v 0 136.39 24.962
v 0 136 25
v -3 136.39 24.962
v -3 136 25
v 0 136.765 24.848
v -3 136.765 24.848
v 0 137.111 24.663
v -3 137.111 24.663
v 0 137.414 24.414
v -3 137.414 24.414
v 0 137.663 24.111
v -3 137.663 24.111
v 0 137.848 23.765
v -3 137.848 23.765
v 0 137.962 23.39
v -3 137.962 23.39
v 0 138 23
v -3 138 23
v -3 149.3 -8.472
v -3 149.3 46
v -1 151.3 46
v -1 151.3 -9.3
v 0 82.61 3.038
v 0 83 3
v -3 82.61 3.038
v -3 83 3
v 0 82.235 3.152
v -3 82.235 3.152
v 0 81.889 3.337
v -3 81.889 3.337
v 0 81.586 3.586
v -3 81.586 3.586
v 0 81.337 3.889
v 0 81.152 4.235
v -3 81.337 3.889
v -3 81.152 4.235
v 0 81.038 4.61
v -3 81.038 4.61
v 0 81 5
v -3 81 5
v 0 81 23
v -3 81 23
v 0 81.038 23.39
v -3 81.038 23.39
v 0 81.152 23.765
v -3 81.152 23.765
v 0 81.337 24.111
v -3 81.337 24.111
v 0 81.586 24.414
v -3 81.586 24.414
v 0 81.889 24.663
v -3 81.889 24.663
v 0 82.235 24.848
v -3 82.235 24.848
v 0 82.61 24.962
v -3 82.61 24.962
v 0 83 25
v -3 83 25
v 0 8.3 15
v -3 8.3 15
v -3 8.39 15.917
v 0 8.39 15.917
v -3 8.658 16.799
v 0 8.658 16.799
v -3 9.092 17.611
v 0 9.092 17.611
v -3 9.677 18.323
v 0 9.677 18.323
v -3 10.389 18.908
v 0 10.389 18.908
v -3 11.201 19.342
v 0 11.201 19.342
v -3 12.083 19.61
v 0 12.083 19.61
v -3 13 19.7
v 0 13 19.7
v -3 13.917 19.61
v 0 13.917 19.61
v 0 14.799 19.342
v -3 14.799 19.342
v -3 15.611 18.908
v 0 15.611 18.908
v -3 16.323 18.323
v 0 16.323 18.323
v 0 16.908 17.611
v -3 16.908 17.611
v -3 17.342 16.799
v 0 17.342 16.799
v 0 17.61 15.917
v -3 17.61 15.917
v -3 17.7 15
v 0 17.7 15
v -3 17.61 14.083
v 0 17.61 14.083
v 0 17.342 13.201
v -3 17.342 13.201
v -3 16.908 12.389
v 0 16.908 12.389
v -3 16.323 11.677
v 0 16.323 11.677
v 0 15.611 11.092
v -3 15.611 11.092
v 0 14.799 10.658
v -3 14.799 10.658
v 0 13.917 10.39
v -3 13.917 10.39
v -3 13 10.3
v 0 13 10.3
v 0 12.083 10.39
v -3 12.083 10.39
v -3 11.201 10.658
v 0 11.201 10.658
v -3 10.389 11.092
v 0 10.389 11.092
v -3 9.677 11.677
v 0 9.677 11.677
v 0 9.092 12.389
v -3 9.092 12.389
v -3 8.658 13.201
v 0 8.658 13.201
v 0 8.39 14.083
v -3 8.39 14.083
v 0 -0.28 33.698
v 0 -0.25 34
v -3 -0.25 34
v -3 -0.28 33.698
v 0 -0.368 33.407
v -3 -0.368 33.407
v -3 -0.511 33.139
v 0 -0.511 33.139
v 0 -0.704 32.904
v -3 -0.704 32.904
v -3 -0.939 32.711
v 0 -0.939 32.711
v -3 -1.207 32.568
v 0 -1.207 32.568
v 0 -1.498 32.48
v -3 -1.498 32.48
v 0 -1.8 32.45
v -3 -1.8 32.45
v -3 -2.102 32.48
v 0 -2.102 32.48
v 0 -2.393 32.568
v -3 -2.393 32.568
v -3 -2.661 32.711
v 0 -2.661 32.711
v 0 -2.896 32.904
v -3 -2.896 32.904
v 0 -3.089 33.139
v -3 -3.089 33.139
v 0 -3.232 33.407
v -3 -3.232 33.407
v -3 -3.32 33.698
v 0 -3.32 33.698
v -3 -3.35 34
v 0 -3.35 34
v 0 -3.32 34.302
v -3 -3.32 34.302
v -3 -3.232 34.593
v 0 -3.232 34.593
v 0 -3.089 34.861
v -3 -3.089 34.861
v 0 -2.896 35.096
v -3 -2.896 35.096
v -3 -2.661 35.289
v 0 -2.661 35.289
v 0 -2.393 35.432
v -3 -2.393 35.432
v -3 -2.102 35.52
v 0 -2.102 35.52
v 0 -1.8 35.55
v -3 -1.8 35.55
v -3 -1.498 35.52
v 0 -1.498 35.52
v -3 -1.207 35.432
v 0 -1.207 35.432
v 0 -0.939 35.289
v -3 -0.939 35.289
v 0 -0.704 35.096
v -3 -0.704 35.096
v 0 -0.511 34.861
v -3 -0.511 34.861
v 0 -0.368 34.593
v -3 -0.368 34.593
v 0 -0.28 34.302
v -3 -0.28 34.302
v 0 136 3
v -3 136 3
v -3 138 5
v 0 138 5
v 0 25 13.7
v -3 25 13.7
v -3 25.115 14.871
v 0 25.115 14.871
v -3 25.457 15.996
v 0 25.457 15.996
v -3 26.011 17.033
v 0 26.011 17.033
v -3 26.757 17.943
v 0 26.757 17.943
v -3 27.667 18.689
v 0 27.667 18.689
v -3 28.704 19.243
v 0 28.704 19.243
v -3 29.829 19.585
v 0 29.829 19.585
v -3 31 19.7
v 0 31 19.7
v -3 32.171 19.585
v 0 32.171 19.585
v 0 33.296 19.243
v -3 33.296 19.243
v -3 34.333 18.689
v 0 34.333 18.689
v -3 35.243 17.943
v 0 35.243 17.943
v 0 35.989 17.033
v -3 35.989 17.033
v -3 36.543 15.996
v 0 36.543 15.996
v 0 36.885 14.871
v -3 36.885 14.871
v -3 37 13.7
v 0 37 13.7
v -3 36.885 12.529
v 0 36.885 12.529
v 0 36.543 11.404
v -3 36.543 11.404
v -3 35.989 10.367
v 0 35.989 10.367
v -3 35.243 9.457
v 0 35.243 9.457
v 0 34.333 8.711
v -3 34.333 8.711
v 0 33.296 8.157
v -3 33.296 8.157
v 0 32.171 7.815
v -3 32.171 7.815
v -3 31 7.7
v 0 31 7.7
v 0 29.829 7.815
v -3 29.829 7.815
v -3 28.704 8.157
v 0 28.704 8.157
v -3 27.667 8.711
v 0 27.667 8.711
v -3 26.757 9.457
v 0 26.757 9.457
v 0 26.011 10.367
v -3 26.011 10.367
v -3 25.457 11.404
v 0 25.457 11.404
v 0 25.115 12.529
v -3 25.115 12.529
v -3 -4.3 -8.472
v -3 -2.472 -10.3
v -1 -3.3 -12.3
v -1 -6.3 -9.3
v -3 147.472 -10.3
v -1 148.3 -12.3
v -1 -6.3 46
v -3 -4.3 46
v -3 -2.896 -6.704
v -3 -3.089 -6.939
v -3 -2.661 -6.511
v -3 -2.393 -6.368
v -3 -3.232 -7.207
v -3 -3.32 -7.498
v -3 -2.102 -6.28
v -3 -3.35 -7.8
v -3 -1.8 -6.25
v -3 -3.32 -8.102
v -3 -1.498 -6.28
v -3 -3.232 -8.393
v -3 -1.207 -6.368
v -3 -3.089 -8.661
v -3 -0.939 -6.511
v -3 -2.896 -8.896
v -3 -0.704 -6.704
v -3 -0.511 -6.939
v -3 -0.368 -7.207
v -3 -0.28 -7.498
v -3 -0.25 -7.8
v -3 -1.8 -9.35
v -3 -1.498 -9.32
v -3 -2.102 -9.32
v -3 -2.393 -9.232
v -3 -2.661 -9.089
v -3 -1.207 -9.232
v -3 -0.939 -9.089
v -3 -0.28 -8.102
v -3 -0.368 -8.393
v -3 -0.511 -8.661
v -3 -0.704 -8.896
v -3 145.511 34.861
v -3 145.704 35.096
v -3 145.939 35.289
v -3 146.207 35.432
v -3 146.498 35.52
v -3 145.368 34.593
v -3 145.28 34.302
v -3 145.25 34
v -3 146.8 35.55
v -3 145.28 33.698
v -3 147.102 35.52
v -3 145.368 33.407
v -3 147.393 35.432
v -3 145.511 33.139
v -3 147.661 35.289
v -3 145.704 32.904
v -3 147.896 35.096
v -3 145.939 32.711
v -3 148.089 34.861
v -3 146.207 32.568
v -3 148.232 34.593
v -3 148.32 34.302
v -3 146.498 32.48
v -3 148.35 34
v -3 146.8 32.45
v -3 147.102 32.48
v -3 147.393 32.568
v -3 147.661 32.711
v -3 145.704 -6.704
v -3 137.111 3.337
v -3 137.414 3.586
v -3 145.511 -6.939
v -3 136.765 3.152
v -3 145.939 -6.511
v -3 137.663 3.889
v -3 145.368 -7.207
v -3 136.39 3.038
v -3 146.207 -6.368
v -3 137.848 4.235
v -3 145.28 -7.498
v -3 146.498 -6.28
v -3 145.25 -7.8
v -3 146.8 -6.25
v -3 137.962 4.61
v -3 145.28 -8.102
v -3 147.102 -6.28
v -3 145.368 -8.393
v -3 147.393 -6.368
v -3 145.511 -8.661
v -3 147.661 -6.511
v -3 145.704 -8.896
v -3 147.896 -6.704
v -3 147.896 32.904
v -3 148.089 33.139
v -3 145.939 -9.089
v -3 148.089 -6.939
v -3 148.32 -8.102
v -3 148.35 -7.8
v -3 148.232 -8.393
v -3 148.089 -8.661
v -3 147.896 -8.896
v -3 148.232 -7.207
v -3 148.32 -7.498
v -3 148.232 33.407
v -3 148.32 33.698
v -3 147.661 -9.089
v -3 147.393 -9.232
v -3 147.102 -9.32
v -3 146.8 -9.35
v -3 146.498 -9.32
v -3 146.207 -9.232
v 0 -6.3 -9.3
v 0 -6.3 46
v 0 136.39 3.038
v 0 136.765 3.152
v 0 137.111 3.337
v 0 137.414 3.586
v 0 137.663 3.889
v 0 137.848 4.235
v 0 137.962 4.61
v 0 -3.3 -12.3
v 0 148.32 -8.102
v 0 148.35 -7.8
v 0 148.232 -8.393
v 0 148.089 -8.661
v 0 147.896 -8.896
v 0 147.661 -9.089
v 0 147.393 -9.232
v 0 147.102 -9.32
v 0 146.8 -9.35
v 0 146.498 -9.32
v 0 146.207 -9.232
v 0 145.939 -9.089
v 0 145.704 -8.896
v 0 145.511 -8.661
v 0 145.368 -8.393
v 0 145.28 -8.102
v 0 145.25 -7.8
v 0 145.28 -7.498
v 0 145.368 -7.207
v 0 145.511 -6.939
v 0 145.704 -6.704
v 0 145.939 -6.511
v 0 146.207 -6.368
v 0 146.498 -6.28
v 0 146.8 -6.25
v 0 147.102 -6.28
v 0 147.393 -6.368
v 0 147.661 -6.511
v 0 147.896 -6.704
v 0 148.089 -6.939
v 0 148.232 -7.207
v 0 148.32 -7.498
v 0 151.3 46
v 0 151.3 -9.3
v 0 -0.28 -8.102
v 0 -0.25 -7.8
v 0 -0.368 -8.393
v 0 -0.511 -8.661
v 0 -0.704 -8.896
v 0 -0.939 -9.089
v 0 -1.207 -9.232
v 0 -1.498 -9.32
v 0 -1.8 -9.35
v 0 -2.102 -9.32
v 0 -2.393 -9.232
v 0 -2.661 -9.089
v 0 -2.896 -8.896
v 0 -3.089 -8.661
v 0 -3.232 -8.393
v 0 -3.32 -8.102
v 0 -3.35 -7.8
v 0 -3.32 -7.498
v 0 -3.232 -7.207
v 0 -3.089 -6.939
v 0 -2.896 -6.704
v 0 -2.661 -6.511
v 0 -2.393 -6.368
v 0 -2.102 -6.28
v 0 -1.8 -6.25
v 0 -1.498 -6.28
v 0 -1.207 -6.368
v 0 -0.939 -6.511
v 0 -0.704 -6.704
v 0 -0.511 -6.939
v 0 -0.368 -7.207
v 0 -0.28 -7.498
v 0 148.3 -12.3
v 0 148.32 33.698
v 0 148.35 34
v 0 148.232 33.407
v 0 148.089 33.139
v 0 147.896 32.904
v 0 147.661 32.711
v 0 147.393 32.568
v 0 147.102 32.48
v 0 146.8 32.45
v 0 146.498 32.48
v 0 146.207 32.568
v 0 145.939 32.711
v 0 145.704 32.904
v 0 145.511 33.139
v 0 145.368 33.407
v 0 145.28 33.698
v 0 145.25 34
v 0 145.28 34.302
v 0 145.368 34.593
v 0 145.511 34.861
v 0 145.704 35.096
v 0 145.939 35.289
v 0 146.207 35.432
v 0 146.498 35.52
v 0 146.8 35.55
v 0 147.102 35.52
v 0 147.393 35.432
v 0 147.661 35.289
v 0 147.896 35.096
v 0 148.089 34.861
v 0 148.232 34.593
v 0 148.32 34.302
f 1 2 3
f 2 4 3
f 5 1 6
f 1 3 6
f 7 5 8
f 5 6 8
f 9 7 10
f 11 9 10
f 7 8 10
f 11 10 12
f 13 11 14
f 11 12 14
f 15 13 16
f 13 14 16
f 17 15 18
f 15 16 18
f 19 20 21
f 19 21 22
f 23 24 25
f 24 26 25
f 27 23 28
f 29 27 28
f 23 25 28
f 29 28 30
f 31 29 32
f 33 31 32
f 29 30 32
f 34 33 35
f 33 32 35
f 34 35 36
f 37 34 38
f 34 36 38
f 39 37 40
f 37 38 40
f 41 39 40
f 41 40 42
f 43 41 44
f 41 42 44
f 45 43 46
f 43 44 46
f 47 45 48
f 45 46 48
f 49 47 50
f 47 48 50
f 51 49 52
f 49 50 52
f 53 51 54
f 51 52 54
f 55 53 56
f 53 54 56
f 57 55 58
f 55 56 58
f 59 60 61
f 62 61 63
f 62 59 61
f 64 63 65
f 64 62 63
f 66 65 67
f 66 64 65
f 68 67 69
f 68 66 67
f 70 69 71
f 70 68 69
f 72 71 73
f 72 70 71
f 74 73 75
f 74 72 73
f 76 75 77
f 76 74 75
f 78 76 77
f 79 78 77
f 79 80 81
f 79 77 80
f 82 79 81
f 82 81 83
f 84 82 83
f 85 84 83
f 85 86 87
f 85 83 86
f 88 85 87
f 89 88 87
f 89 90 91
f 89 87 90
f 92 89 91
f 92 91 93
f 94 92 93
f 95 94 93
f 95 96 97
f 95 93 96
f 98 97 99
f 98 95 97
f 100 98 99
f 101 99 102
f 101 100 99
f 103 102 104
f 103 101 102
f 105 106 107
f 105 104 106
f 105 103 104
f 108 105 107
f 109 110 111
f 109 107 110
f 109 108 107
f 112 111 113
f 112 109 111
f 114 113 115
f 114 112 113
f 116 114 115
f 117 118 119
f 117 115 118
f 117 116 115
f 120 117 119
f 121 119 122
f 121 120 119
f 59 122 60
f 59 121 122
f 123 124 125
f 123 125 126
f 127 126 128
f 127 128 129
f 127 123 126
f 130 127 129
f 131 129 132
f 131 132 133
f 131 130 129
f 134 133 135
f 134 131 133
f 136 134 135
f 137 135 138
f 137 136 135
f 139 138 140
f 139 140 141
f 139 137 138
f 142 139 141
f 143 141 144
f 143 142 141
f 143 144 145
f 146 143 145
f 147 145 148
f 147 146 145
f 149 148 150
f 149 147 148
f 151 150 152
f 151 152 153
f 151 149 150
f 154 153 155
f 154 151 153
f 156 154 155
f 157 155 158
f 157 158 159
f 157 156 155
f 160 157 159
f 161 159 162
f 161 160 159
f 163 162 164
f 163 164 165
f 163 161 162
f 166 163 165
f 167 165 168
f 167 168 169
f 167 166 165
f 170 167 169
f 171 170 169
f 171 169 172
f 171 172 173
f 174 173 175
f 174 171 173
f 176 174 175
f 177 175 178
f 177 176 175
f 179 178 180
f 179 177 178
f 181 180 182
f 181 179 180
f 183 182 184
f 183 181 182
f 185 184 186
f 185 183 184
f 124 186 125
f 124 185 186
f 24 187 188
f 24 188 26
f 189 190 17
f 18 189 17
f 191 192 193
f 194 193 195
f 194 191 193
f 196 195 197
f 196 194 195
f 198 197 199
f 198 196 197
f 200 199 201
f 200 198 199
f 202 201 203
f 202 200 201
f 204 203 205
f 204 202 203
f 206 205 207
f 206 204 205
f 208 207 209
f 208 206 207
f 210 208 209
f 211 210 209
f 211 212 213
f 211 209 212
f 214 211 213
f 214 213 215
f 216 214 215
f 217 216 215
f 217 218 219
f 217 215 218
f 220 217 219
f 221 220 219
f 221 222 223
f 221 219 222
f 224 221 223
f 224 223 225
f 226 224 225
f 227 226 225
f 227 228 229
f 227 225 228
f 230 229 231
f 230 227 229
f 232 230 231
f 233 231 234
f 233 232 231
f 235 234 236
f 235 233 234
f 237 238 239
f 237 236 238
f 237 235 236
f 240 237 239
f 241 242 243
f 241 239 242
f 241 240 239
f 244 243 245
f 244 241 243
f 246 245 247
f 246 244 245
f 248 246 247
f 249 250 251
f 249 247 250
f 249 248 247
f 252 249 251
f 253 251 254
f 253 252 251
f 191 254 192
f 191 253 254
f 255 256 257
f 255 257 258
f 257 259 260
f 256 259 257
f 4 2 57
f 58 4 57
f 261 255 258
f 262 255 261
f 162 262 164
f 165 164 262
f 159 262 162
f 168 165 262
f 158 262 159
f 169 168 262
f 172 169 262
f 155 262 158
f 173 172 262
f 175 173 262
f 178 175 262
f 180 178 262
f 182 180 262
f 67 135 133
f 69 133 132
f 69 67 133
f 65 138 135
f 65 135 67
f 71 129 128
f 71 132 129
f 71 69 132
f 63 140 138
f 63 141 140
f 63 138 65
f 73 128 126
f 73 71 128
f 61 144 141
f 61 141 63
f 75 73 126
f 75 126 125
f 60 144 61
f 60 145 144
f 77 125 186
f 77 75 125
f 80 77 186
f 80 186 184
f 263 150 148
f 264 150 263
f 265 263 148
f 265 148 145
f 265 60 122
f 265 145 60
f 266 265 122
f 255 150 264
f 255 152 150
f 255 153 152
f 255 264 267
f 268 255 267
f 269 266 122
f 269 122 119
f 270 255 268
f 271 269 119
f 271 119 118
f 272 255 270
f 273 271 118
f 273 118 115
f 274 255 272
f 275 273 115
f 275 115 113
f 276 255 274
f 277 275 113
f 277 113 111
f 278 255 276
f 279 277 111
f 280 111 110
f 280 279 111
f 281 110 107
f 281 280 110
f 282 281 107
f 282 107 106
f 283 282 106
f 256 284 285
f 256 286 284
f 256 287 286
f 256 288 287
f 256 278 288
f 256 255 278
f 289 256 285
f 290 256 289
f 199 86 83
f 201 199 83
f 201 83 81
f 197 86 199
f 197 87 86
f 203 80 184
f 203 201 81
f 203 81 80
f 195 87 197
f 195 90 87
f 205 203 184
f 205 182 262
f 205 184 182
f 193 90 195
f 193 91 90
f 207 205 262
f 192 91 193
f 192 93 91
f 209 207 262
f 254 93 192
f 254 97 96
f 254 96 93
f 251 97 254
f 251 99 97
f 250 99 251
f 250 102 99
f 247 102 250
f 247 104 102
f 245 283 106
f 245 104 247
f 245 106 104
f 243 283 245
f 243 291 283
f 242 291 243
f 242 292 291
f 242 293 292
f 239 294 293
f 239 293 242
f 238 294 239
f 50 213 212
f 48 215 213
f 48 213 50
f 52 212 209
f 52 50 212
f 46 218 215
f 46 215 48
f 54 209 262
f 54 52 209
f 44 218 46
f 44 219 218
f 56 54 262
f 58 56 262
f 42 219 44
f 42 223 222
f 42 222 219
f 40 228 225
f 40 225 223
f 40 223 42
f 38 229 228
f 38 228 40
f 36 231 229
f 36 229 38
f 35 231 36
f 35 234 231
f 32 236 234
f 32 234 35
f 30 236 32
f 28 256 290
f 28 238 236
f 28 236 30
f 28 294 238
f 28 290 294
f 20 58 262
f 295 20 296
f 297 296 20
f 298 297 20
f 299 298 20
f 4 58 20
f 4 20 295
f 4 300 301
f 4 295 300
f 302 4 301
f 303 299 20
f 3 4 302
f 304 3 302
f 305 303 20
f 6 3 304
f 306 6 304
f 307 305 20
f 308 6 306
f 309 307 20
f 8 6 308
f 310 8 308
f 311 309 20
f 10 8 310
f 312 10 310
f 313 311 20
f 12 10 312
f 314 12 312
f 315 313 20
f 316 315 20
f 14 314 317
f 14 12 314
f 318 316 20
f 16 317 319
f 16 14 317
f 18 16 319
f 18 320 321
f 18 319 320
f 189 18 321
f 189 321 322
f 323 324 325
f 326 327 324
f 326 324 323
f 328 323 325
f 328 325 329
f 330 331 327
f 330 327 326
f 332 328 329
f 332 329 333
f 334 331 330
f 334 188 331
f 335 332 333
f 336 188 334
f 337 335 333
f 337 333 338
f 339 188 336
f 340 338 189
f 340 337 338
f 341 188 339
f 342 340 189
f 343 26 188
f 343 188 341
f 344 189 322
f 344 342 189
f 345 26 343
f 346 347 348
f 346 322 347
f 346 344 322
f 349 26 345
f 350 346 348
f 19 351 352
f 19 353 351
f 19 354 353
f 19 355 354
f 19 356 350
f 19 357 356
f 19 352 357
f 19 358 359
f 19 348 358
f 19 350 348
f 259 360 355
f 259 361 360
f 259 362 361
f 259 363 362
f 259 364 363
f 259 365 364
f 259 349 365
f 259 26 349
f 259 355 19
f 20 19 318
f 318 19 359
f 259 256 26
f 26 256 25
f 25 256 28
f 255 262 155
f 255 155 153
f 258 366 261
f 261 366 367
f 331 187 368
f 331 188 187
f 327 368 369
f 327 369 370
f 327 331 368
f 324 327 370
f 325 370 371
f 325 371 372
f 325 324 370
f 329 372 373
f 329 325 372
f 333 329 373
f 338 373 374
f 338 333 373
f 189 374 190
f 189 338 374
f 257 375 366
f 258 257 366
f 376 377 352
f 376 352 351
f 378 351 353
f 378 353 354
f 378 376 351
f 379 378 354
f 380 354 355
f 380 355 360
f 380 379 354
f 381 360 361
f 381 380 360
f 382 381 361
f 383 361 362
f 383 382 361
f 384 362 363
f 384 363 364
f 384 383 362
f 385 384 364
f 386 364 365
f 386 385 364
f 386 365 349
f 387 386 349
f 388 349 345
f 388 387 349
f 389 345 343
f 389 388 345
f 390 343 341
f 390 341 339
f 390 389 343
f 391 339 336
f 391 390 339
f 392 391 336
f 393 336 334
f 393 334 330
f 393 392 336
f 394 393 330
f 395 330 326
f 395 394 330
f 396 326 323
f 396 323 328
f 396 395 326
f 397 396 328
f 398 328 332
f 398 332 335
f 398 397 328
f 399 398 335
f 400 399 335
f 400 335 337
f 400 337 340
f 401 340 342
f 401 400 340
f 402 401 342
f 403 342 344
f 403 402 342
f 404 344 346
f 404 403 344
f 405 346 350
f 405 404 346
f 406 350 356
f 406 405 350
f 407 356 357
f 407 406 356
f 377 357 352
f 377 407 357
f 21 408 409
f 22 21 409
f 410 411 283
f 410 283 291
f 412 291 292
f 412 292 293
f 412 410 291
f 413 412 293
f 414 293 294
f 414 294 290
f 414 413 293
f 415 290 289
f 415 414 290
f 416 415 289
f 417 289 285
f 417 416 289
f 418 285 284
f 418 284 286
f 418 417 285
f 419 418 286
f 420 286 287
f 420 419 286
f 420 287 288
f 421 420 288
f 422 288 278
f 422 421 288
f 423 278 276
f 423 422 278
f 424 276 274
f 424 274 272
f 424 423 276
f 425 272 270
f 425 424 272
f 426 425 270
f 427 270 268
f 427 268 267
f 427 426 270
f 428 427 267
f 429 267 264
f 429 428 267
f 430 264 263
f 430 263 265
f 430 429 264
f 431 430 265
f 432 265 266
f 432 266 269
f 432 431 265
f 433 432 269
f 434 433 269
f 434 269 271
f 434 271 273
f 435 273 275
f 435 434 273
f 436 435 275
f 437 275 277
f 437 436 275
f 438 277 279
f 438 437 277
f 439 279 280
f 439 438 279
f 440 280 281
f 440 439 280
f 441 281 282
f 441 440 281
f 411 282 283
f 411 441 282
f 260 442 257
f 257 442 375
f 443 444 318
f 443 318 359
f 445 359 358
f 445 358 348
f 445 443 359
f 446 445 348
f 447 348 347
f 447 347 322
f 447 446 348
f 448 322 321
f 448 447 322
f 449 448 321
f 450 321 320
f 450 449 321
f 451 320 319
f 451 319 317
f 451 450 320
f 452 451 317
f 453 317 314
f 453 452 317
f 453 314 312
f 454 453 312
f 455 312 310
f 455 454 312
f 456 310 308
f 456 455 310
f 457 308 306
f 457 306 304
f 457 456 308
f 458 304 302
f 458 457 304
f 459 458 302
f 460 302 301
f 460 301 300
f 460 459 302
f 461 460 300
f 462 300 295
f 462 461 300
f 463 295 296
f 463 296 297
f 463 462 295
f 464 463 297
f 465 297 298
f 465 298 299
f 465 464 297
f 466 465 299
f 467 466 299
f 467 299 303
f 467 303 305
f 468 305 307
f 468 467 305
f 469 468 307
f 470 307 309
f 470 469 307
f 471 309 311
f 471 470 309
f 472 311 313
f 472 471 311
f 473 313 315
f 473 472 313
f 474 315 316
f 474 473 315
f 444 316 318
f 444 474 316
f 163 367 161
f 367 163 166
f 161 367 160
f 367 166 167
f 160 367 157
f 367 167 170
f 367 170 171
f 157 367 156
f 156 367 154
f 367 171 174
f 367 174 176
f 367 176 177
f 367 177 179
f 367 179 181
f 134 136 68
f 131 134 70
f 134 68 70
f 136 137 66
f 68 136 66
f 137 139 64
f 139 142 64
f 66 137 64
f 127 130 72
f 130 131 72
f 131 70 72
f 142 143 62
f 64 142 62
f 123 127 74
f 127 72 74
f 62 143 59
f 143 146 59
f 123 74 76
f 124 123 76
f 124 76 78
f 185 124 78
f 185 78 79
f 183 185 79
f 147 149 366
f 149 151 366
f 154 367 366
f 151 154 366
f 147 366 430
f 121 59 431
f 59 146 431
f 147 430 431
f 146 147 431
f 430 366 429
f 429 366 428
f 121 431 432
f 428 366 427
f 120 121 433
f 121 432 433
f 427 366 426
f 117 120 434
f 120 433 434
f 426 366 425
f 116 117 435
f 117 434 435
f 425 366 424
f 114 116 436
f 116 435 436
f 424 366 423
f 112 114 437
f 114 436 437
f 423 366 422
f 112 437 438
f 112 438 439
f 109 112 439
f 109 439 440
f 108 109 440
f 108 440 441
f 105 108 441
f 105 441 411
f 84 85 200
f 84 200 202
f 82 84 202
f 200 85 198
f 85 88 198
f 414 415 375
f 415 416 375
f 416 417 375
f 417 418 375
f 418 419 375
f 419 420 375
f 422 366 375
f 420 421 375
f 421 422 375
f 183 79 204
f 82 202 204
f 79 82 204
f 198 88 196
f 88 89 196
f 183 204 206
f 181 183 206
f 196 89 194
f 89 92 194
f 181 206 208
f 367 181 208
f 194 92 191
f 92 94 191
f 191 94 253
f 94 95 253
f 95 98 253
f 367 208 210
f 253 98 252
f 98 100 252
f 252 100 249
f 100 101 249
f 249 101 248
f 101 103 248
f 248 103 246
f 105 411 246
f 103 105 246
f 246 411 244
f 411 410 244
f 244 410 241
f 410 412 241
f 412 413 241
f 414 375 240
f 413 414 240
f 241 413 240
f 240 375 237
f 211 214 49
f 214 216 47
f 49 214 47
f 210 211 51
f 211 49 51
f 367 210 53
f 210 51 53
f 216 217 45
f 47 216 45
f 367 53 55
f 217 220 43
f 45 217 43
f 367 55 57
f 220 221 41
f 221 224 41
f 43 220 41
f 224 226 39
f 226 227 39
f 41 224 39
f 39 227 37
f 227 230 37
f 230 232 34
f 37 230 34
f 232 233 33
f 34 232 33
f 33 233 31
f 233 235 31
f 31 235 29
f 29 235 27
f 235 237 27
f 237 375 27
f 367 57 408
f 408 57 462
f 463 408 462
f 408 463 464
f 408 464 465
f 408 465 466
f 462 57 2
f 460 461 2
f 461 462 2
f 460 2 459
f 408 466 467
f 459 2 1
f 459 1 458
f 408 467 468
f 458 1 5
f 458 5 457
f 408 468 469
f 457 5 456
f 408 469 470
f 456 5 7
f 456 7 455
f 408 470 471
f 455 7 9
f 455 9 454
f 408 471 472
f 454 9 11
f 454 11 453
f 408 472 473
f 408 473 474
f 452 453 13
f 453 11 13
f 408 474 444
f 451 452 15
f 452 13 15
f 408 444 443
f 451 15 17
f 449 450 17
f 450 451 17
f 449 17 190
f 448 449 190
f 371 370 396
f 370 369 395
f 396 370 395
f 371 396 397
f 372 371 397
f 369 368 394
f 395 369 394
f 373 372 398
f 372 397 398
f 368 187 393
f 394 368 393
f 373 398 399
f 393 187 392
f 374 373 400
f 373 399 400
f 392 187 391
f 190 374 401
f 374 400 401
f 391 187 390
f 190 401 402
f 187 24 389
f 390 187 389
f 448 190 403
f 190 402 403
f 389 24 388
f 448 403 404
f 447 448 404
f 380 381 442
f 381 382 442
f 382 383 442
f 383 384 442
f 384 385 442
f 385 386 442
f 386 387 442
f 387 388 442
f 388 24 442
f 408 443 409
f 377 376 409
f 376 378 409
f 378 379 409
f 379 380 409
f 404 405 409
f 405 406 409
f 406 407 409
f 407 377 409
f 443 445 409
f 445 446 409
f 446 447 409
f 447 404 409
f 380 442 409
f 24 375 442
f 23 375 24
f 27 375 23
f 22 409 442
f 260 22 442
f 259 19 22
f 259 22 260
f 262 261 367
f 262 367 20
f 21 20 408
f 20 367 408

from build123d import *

# Parameters (mm, degrees)
SKETCH010_R     = 1.55
PAD005_DEPTH    = 3
SKETCH011_R     = 6
SKETCH011_R_2   = 4.7
SKETCH011_W     = 57
SKETCH011_H     = 22
POCKET005_DEPTH = 5
FILLET001_R     = 2
CHAMFER003_SIZE = 2


with BuildPart() as part:
    # Sketch010 (on ShapeBinder) → Pad005 (new body)
    with BuildSketch(Plane(origin=(0, 0, 0), x_dir=(0, 1, 0), z_dir=(-1, 0, 0))):
        Polygon((-6.3, -46), (151.3, -46), (151.3, 9.3), (148.3, 12.3), (-3.3, 12.3), (-6.3, 9.3), align=None)
        with Locations((-1.8, 7.8)):
            Circle(SKETCH010_R, mode=Mode.SUBTRACT)
        with Locations((-1.8, -34)):
            Circle(SKETCH010_R, mode=Mode.SUBTRACT)
        with Locations((146.8, 7.8)):
            Circle(SKETCH010_R, mode=Mode.SUBTRACT)
        with Locations((146.8, -34)):
            Circle(SKETCH010_R, mode=Mode.SUBTRACT)
    extrude(amount=PAD005_DEPTH)

    # Sketch011 (on ShapeBinder) → Pocket005 (cut)
    with BuildSketch(Plane(origin=(0, 0, 0), x_dir=(0, -1, 0), z_dir=(-1, 0, 0))):
        with Locations((-31, 13.7)):
            Circle(SKETCH011_R)
        with Locations((-13, 15)):
            Circle(SKETCH011_R_2)
        with Locations((-109.5, 14)):
            Rectangle(SKETCH011_W, SKETCH011_H)
    extrude(amount=POCKET005_DEPTH, mode=Mode.SUBTRACT)

    # Fillet001
    fillet001_edges = [part.edges().sort_by_distance(p)[0] for p in [
        (-1.5, 138, 3),
        (-1.5, 138, 25),
        (-1.5, 81, 25),
        (-1.5, 81, 3),
    ]]
    fillet(fillet001_edges, radius=FILLET001_R)

    # Chamfer003
    chamfer003_edges = [part.edges().sort_by_distance(p)[0] for p in [
        (-3, 72.5, -12.3),
        (-3, 151.3, 18.35),
        (-3, -6.3, 18.35),
        (-3, 149.8, -10.8),
        (-3, -4.8, -10.8),
    ]]
    chamfer(chamfer003_edges, length=CHAMFER003_SIZE)


solid = part.part
